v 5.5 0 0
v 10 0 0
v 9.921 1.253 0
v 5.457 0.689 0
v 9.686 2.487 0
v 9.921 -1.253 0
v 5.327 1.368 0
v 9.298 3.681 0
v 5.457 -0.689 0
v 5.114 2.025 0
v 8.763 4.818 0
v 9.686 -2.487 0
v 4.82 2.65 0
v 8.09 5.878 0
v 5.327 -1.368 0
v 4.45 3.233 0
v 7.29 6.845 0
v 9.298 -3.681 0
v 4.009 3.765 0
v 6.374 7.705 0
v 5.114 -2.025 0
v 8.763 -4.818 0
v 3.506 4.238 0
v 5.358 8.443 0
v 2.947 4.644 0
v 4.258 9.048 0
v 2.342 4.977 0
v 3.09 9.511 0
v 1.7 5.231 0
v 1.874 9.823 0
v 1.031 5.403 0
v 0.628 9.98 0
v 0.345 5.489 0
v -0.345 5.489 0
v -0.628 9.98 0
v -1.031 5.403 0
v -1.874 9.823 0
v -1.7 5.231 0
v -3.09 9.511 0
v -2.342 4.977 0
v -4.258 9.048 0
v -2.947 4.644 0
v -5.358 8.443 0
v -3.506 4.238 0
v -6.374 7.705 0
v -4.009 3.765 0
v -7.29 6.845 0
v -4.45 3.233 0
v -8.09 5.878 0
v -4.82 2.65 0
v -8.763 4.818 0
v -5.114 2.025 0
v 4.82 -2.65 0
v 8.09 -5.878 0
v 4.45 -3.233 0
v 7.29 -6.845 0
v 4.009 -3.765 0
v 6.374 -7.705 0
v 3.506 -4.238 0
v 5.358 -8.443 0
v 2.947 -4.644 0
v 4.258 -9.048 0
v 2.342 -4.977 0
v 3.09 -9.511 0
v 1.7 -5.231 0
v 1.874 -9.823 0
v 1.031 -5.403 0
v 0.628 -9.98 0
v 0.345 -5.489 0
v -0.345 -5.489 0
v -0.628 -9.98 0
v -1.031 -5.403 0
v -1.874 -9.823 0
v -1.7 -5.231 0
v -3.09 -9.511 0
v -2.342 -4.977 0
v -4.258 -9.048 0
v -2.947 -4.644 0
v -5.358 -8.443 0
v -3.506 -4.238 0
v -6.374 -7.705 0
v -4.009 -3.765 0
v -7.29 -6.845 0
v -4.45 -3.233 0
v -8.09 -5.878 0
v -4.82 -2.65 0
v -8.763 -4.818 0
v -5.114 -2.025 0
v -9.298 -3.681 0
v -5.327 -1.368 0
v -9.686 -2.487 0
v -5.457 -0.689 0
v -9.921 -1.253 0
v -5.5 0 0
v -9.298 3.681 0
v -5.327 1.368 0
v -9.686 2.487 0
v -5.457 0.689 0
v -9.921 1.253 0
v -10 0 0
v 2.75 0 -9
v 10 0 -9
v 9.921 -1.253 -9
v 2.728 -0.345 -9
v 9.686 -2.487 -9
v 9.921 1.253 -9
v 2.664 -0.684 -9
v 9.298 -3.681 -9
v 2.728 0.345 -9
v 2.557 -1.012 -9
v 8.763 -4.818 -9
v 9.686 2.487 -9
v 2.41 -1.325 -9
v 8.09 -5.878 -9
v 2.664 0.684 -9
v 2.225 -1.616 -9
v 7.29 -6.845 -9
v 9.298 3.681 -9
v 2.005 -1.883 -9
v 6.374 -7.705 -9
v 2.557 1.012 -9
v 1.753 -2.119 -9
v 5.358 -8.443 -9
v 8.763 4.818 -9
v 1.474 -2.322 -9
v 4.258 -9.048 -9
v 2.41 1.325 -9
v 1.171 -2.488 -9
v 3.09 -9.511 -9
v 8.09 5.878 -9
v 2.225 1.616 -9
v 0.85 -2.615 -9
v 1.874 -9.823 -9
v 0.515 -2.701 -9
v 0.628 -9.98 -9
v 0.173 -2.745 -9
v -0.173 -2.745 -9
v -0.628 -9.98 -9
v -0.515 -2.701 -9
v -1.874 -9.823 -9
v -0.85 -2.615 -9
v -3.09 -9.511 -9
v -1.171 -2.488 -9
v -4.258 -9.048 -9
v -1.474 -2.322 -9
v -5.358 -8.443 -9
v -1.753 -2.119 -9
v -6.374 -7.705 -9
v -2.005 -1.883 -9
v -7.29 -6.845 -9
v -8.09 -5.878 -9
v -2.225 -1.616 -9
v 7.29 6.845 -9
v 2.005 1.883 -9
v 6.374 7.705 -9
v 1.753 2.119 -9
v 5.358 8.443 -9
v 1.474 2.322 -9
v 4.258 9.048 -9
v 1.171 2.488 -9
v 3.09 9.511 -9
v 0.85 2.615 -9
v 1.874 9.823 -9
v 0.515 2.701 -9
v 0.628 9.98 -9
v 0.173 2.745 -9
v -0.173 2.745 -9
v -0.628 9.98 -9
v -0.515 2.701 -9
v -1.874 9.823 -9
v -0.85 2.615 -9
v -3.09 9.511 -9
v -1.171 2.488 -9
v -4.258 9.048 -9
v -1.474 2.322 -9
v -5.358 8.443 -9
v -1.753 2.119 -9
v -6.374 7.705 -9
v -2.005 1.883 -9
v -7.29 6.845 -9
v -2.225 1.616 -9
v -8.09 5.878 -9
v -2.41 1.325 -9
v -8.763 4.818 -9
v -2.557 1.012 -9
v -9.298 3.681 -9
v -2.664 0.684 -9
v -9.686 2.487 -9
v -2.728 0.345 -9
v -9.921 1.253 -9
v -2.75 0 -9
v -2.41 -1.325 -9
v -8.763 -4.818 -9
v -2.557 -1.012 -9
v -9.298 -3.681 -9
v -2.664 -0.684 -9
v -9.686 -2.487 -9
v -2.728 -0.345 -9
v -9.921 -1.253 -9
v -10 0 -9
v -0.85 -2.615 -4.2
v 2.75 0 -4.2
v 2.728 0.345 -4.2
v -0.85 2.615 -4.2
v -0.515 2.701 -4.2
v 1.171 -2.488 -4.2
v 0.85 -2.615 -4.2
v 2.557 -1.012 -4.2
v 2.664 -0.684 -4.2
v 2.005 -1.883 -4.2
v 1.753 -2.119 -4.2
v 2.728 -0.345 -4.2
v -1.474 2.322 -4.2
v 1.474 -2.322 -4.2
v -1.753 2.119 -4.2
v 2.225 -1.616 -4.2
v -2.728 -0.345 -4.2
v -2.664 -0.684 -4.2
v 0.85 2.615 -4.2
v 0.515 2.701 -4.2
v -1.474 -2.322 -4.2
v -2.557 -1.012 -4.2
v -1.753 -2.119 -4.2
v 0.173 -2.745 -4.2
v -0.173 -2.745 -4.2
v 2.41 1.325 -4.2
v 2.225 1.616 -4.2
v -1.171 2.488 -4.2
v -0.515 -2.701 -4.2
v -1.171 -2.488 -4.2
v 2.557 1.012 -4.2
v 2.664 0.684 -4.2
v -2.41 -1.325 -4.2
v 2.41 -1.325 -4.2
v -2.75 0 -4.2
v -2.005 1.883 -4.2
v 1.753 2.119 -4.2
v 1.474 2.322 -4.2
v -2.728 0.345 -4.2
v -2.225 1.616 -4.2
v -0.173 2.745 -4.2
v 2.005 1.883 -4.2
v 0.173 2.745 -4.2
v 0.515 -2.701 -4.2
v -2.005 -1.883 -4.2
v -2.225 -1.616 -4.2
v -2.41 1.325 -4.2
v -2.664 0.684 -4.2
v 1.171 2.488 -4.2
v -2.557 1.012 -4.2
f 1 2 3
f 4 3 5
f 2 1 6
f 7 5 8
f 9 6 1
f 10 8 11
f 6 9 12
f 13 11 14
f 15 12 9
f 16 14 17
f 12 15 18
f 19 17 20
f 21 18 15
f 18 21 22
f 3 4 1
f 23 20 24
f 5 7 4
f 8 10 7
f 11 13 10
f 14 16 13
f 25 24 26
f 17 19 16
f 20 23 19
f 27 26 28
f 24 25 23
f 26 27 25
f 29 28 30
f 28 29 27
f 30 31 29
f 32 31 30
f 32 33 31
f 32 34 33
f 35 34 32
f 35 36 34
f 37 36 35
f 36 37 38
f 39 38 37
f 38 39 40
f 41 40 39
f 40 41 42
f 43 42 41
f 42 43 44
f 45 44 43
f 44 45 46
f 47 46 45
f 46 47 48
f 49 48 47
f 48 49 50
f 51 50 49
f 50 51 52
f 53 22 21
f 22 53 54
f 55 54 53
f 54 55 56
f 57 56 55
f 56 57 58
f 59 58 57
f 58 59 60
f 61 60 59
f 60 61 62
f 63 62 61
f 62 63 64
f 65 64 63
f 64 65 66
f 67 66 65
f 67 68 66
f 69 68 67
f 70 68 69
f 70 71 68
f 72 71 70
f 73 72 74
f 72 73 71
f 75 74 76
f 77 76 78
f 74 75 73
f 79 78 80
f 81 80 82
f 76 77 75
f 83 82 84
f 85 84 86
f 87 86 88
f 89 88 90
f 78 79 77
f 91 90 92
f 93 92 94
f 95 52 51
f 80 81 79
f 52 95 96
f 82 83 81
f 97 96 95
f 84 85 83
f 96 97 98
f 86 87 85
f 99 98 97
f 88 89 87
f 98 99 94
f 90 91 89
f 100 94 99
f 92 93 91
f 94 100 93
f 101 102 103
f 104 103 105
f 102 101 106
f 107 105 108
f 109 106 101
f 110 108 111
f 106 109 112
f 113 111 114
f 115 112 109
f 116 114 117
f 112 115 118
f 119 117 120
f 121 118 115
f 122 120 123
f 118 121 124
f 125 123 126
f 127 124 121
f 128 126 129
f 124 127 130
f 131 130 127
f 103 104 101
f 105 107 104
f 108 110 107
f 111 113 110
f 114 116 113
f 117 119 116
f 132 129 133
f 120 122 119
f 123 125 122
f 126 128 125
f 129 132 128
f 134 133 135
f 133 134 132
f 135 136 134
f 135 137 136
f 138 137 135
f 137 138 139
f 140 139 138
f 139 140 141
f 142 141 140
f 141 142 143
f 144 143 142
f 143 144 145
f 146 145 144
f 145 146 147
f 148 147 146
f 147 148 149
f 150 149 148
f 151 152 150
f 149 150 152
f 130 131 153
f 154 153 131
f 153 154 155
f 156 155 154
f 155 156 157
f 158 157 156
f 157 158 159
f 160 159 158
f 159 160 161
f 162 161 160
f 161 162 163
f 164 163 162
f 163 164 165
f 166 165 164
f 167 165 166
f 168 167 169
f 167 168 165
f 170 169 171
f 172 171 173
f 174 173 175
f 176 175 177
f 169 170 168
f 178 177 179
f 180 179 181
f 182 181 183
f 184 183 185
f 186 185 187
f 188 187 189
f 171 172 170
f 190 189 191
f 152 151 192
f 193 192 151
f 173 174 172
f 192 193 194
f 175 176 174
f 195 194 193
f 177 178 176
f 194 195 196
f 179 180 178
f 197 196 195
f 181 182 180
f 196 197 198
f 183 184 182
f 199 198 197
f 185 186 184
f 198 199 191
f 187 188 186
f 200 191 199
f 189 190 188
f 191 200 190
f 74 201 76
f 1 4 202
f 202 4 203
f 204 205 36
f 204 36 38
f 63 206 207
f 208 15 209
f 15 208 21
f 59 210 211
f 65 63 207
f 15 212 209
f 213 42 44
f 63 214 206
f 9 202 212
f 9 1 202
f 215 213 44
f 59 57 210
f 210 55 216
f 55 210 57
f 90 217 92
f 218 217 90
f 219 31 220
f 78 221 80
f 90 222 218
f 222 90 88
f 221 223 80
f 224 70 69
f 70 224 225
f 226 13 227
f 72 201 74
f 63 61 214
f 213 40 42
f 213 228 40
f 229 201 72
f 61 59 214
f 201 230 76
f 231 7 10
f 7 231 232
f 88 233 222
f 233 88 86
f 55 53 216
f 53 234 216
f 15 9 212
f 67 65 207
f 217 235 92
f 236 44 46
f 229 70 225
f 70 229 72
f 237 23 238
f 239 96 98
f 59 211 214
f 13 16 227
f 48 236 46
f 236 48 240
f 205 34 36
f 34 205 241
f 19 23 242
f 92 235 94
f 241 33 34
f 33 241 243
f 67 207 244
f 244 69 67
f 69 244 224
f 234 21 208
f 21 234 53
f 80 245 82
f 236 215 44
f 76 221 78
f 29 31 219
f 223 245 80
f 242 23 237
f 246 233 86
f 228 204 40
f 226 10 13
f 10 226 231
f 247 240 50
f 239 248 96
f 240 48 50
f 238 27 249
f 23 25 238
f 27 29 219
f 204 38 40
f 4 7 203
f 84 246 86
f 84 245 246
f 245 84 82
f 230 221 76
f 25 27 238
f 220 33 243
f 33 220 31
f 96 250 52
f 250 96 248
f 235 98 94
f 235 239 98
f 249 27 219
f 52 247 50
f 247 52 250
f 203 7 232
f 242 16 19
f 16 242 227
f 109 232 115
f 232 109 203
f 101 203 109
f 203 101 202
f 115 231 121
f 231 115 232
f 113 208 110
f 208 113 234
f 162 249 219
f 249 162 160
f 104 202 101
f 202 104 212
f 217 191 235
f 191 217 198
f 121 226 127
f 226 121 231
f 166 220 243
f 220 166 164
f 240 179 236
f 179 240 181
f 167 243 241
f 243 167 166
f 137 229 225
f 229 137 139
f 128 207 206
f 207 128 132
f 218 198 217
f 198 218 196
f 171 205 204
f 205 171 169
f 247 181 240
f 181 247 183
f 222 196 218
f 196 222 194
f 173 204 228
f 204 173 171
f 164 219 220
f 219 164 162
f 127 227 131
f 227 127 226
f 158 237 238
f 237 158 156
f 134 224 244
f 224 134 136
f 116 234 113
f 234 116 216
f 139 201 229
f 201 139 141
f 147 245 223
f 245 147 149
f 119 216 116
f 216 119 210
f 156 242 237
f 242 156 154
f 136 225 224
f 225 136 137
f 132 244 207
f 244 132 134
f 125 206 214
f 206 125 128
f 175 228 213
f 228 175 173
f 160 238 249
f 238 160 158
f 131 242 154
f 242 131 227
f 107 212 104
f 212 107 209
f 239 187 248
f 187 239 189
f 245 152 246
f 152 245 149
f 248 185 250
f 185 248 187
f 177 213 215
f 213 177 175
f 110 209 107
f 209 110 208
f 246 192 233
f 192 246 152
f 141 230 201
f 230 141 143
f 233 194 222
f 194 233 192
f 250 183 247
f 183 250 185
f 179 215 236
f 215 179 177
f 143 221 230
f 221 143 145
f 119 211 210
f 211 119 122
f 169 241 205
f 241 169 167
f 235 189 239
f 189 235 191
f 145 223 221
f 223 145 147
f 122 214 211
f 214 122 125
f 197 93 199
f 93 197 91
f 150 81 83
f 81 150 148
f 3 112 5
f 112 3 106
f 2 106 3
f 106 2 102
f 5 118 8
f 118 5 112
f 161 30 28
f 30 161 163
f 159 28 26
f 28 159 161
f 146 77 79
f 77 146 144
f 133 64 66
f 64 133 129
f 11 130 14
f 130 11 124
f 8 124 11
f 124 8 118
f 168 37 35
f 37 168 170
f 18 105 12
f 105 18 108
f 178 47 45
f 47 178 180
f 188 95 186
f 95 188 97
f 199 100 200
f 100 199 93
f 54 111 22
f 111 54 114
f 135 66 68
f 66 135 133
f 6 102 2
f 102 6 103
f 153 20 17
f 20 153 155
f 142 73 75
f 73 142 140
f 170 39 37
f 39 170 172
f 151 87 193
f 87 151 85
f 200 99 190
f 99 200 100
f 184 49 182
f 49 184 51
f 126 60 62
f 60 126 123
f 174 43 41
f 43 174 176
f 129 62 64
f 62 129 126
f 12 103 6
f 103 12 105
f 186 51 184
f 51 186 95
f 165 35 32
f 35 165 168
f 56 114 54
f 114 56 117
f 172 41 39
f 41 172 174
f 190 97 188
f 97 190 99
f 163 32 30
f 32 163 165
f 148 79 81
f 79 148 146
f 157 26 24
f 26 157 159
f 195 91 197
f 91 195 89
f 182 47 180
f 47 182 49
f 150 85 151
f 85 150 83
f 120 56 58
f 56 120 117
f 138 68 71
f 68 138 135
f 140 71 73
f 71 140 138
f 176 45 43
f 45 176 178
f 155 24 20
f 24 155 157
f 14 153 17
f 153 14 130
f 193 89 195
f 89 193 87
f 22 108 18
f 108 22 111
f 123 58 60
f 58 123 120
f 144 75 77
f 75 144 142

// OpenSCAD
$fn = 50;


difference() {
	union() {
		translate(v = [0, 0, -9.0000000000]) {
			cylinder(h = 9, r = 10.0000000000);
		}
	}
	union() {
		translate(v = [0, 0, 0]) {
			rotate(a = [0, 0, 0]) {
				difference() {
					union() {
						#translate(v = [0, 0, -9.0000000000]) {
							cylinder(h = 9, r = 2.2500000000);
						}
						#translate(v = [0, 0, -4.2000000000]) {
							cylinder(h = 4.2000000000, r = 10.0000000000, r1 = 2.7500000000, r2 = 5.5000000000);
						}
						#translate(v = [0, 0, -9.0000000000]) {
							cylinder(h = 9, r = 2.7500000000);
						}
						#translate(v = [0, 0, -9.0000000000]) {
							cylinder(h = 9, r = 2.2500000000);
						}
					}
					union();
				}
			}
		}
	}
}
